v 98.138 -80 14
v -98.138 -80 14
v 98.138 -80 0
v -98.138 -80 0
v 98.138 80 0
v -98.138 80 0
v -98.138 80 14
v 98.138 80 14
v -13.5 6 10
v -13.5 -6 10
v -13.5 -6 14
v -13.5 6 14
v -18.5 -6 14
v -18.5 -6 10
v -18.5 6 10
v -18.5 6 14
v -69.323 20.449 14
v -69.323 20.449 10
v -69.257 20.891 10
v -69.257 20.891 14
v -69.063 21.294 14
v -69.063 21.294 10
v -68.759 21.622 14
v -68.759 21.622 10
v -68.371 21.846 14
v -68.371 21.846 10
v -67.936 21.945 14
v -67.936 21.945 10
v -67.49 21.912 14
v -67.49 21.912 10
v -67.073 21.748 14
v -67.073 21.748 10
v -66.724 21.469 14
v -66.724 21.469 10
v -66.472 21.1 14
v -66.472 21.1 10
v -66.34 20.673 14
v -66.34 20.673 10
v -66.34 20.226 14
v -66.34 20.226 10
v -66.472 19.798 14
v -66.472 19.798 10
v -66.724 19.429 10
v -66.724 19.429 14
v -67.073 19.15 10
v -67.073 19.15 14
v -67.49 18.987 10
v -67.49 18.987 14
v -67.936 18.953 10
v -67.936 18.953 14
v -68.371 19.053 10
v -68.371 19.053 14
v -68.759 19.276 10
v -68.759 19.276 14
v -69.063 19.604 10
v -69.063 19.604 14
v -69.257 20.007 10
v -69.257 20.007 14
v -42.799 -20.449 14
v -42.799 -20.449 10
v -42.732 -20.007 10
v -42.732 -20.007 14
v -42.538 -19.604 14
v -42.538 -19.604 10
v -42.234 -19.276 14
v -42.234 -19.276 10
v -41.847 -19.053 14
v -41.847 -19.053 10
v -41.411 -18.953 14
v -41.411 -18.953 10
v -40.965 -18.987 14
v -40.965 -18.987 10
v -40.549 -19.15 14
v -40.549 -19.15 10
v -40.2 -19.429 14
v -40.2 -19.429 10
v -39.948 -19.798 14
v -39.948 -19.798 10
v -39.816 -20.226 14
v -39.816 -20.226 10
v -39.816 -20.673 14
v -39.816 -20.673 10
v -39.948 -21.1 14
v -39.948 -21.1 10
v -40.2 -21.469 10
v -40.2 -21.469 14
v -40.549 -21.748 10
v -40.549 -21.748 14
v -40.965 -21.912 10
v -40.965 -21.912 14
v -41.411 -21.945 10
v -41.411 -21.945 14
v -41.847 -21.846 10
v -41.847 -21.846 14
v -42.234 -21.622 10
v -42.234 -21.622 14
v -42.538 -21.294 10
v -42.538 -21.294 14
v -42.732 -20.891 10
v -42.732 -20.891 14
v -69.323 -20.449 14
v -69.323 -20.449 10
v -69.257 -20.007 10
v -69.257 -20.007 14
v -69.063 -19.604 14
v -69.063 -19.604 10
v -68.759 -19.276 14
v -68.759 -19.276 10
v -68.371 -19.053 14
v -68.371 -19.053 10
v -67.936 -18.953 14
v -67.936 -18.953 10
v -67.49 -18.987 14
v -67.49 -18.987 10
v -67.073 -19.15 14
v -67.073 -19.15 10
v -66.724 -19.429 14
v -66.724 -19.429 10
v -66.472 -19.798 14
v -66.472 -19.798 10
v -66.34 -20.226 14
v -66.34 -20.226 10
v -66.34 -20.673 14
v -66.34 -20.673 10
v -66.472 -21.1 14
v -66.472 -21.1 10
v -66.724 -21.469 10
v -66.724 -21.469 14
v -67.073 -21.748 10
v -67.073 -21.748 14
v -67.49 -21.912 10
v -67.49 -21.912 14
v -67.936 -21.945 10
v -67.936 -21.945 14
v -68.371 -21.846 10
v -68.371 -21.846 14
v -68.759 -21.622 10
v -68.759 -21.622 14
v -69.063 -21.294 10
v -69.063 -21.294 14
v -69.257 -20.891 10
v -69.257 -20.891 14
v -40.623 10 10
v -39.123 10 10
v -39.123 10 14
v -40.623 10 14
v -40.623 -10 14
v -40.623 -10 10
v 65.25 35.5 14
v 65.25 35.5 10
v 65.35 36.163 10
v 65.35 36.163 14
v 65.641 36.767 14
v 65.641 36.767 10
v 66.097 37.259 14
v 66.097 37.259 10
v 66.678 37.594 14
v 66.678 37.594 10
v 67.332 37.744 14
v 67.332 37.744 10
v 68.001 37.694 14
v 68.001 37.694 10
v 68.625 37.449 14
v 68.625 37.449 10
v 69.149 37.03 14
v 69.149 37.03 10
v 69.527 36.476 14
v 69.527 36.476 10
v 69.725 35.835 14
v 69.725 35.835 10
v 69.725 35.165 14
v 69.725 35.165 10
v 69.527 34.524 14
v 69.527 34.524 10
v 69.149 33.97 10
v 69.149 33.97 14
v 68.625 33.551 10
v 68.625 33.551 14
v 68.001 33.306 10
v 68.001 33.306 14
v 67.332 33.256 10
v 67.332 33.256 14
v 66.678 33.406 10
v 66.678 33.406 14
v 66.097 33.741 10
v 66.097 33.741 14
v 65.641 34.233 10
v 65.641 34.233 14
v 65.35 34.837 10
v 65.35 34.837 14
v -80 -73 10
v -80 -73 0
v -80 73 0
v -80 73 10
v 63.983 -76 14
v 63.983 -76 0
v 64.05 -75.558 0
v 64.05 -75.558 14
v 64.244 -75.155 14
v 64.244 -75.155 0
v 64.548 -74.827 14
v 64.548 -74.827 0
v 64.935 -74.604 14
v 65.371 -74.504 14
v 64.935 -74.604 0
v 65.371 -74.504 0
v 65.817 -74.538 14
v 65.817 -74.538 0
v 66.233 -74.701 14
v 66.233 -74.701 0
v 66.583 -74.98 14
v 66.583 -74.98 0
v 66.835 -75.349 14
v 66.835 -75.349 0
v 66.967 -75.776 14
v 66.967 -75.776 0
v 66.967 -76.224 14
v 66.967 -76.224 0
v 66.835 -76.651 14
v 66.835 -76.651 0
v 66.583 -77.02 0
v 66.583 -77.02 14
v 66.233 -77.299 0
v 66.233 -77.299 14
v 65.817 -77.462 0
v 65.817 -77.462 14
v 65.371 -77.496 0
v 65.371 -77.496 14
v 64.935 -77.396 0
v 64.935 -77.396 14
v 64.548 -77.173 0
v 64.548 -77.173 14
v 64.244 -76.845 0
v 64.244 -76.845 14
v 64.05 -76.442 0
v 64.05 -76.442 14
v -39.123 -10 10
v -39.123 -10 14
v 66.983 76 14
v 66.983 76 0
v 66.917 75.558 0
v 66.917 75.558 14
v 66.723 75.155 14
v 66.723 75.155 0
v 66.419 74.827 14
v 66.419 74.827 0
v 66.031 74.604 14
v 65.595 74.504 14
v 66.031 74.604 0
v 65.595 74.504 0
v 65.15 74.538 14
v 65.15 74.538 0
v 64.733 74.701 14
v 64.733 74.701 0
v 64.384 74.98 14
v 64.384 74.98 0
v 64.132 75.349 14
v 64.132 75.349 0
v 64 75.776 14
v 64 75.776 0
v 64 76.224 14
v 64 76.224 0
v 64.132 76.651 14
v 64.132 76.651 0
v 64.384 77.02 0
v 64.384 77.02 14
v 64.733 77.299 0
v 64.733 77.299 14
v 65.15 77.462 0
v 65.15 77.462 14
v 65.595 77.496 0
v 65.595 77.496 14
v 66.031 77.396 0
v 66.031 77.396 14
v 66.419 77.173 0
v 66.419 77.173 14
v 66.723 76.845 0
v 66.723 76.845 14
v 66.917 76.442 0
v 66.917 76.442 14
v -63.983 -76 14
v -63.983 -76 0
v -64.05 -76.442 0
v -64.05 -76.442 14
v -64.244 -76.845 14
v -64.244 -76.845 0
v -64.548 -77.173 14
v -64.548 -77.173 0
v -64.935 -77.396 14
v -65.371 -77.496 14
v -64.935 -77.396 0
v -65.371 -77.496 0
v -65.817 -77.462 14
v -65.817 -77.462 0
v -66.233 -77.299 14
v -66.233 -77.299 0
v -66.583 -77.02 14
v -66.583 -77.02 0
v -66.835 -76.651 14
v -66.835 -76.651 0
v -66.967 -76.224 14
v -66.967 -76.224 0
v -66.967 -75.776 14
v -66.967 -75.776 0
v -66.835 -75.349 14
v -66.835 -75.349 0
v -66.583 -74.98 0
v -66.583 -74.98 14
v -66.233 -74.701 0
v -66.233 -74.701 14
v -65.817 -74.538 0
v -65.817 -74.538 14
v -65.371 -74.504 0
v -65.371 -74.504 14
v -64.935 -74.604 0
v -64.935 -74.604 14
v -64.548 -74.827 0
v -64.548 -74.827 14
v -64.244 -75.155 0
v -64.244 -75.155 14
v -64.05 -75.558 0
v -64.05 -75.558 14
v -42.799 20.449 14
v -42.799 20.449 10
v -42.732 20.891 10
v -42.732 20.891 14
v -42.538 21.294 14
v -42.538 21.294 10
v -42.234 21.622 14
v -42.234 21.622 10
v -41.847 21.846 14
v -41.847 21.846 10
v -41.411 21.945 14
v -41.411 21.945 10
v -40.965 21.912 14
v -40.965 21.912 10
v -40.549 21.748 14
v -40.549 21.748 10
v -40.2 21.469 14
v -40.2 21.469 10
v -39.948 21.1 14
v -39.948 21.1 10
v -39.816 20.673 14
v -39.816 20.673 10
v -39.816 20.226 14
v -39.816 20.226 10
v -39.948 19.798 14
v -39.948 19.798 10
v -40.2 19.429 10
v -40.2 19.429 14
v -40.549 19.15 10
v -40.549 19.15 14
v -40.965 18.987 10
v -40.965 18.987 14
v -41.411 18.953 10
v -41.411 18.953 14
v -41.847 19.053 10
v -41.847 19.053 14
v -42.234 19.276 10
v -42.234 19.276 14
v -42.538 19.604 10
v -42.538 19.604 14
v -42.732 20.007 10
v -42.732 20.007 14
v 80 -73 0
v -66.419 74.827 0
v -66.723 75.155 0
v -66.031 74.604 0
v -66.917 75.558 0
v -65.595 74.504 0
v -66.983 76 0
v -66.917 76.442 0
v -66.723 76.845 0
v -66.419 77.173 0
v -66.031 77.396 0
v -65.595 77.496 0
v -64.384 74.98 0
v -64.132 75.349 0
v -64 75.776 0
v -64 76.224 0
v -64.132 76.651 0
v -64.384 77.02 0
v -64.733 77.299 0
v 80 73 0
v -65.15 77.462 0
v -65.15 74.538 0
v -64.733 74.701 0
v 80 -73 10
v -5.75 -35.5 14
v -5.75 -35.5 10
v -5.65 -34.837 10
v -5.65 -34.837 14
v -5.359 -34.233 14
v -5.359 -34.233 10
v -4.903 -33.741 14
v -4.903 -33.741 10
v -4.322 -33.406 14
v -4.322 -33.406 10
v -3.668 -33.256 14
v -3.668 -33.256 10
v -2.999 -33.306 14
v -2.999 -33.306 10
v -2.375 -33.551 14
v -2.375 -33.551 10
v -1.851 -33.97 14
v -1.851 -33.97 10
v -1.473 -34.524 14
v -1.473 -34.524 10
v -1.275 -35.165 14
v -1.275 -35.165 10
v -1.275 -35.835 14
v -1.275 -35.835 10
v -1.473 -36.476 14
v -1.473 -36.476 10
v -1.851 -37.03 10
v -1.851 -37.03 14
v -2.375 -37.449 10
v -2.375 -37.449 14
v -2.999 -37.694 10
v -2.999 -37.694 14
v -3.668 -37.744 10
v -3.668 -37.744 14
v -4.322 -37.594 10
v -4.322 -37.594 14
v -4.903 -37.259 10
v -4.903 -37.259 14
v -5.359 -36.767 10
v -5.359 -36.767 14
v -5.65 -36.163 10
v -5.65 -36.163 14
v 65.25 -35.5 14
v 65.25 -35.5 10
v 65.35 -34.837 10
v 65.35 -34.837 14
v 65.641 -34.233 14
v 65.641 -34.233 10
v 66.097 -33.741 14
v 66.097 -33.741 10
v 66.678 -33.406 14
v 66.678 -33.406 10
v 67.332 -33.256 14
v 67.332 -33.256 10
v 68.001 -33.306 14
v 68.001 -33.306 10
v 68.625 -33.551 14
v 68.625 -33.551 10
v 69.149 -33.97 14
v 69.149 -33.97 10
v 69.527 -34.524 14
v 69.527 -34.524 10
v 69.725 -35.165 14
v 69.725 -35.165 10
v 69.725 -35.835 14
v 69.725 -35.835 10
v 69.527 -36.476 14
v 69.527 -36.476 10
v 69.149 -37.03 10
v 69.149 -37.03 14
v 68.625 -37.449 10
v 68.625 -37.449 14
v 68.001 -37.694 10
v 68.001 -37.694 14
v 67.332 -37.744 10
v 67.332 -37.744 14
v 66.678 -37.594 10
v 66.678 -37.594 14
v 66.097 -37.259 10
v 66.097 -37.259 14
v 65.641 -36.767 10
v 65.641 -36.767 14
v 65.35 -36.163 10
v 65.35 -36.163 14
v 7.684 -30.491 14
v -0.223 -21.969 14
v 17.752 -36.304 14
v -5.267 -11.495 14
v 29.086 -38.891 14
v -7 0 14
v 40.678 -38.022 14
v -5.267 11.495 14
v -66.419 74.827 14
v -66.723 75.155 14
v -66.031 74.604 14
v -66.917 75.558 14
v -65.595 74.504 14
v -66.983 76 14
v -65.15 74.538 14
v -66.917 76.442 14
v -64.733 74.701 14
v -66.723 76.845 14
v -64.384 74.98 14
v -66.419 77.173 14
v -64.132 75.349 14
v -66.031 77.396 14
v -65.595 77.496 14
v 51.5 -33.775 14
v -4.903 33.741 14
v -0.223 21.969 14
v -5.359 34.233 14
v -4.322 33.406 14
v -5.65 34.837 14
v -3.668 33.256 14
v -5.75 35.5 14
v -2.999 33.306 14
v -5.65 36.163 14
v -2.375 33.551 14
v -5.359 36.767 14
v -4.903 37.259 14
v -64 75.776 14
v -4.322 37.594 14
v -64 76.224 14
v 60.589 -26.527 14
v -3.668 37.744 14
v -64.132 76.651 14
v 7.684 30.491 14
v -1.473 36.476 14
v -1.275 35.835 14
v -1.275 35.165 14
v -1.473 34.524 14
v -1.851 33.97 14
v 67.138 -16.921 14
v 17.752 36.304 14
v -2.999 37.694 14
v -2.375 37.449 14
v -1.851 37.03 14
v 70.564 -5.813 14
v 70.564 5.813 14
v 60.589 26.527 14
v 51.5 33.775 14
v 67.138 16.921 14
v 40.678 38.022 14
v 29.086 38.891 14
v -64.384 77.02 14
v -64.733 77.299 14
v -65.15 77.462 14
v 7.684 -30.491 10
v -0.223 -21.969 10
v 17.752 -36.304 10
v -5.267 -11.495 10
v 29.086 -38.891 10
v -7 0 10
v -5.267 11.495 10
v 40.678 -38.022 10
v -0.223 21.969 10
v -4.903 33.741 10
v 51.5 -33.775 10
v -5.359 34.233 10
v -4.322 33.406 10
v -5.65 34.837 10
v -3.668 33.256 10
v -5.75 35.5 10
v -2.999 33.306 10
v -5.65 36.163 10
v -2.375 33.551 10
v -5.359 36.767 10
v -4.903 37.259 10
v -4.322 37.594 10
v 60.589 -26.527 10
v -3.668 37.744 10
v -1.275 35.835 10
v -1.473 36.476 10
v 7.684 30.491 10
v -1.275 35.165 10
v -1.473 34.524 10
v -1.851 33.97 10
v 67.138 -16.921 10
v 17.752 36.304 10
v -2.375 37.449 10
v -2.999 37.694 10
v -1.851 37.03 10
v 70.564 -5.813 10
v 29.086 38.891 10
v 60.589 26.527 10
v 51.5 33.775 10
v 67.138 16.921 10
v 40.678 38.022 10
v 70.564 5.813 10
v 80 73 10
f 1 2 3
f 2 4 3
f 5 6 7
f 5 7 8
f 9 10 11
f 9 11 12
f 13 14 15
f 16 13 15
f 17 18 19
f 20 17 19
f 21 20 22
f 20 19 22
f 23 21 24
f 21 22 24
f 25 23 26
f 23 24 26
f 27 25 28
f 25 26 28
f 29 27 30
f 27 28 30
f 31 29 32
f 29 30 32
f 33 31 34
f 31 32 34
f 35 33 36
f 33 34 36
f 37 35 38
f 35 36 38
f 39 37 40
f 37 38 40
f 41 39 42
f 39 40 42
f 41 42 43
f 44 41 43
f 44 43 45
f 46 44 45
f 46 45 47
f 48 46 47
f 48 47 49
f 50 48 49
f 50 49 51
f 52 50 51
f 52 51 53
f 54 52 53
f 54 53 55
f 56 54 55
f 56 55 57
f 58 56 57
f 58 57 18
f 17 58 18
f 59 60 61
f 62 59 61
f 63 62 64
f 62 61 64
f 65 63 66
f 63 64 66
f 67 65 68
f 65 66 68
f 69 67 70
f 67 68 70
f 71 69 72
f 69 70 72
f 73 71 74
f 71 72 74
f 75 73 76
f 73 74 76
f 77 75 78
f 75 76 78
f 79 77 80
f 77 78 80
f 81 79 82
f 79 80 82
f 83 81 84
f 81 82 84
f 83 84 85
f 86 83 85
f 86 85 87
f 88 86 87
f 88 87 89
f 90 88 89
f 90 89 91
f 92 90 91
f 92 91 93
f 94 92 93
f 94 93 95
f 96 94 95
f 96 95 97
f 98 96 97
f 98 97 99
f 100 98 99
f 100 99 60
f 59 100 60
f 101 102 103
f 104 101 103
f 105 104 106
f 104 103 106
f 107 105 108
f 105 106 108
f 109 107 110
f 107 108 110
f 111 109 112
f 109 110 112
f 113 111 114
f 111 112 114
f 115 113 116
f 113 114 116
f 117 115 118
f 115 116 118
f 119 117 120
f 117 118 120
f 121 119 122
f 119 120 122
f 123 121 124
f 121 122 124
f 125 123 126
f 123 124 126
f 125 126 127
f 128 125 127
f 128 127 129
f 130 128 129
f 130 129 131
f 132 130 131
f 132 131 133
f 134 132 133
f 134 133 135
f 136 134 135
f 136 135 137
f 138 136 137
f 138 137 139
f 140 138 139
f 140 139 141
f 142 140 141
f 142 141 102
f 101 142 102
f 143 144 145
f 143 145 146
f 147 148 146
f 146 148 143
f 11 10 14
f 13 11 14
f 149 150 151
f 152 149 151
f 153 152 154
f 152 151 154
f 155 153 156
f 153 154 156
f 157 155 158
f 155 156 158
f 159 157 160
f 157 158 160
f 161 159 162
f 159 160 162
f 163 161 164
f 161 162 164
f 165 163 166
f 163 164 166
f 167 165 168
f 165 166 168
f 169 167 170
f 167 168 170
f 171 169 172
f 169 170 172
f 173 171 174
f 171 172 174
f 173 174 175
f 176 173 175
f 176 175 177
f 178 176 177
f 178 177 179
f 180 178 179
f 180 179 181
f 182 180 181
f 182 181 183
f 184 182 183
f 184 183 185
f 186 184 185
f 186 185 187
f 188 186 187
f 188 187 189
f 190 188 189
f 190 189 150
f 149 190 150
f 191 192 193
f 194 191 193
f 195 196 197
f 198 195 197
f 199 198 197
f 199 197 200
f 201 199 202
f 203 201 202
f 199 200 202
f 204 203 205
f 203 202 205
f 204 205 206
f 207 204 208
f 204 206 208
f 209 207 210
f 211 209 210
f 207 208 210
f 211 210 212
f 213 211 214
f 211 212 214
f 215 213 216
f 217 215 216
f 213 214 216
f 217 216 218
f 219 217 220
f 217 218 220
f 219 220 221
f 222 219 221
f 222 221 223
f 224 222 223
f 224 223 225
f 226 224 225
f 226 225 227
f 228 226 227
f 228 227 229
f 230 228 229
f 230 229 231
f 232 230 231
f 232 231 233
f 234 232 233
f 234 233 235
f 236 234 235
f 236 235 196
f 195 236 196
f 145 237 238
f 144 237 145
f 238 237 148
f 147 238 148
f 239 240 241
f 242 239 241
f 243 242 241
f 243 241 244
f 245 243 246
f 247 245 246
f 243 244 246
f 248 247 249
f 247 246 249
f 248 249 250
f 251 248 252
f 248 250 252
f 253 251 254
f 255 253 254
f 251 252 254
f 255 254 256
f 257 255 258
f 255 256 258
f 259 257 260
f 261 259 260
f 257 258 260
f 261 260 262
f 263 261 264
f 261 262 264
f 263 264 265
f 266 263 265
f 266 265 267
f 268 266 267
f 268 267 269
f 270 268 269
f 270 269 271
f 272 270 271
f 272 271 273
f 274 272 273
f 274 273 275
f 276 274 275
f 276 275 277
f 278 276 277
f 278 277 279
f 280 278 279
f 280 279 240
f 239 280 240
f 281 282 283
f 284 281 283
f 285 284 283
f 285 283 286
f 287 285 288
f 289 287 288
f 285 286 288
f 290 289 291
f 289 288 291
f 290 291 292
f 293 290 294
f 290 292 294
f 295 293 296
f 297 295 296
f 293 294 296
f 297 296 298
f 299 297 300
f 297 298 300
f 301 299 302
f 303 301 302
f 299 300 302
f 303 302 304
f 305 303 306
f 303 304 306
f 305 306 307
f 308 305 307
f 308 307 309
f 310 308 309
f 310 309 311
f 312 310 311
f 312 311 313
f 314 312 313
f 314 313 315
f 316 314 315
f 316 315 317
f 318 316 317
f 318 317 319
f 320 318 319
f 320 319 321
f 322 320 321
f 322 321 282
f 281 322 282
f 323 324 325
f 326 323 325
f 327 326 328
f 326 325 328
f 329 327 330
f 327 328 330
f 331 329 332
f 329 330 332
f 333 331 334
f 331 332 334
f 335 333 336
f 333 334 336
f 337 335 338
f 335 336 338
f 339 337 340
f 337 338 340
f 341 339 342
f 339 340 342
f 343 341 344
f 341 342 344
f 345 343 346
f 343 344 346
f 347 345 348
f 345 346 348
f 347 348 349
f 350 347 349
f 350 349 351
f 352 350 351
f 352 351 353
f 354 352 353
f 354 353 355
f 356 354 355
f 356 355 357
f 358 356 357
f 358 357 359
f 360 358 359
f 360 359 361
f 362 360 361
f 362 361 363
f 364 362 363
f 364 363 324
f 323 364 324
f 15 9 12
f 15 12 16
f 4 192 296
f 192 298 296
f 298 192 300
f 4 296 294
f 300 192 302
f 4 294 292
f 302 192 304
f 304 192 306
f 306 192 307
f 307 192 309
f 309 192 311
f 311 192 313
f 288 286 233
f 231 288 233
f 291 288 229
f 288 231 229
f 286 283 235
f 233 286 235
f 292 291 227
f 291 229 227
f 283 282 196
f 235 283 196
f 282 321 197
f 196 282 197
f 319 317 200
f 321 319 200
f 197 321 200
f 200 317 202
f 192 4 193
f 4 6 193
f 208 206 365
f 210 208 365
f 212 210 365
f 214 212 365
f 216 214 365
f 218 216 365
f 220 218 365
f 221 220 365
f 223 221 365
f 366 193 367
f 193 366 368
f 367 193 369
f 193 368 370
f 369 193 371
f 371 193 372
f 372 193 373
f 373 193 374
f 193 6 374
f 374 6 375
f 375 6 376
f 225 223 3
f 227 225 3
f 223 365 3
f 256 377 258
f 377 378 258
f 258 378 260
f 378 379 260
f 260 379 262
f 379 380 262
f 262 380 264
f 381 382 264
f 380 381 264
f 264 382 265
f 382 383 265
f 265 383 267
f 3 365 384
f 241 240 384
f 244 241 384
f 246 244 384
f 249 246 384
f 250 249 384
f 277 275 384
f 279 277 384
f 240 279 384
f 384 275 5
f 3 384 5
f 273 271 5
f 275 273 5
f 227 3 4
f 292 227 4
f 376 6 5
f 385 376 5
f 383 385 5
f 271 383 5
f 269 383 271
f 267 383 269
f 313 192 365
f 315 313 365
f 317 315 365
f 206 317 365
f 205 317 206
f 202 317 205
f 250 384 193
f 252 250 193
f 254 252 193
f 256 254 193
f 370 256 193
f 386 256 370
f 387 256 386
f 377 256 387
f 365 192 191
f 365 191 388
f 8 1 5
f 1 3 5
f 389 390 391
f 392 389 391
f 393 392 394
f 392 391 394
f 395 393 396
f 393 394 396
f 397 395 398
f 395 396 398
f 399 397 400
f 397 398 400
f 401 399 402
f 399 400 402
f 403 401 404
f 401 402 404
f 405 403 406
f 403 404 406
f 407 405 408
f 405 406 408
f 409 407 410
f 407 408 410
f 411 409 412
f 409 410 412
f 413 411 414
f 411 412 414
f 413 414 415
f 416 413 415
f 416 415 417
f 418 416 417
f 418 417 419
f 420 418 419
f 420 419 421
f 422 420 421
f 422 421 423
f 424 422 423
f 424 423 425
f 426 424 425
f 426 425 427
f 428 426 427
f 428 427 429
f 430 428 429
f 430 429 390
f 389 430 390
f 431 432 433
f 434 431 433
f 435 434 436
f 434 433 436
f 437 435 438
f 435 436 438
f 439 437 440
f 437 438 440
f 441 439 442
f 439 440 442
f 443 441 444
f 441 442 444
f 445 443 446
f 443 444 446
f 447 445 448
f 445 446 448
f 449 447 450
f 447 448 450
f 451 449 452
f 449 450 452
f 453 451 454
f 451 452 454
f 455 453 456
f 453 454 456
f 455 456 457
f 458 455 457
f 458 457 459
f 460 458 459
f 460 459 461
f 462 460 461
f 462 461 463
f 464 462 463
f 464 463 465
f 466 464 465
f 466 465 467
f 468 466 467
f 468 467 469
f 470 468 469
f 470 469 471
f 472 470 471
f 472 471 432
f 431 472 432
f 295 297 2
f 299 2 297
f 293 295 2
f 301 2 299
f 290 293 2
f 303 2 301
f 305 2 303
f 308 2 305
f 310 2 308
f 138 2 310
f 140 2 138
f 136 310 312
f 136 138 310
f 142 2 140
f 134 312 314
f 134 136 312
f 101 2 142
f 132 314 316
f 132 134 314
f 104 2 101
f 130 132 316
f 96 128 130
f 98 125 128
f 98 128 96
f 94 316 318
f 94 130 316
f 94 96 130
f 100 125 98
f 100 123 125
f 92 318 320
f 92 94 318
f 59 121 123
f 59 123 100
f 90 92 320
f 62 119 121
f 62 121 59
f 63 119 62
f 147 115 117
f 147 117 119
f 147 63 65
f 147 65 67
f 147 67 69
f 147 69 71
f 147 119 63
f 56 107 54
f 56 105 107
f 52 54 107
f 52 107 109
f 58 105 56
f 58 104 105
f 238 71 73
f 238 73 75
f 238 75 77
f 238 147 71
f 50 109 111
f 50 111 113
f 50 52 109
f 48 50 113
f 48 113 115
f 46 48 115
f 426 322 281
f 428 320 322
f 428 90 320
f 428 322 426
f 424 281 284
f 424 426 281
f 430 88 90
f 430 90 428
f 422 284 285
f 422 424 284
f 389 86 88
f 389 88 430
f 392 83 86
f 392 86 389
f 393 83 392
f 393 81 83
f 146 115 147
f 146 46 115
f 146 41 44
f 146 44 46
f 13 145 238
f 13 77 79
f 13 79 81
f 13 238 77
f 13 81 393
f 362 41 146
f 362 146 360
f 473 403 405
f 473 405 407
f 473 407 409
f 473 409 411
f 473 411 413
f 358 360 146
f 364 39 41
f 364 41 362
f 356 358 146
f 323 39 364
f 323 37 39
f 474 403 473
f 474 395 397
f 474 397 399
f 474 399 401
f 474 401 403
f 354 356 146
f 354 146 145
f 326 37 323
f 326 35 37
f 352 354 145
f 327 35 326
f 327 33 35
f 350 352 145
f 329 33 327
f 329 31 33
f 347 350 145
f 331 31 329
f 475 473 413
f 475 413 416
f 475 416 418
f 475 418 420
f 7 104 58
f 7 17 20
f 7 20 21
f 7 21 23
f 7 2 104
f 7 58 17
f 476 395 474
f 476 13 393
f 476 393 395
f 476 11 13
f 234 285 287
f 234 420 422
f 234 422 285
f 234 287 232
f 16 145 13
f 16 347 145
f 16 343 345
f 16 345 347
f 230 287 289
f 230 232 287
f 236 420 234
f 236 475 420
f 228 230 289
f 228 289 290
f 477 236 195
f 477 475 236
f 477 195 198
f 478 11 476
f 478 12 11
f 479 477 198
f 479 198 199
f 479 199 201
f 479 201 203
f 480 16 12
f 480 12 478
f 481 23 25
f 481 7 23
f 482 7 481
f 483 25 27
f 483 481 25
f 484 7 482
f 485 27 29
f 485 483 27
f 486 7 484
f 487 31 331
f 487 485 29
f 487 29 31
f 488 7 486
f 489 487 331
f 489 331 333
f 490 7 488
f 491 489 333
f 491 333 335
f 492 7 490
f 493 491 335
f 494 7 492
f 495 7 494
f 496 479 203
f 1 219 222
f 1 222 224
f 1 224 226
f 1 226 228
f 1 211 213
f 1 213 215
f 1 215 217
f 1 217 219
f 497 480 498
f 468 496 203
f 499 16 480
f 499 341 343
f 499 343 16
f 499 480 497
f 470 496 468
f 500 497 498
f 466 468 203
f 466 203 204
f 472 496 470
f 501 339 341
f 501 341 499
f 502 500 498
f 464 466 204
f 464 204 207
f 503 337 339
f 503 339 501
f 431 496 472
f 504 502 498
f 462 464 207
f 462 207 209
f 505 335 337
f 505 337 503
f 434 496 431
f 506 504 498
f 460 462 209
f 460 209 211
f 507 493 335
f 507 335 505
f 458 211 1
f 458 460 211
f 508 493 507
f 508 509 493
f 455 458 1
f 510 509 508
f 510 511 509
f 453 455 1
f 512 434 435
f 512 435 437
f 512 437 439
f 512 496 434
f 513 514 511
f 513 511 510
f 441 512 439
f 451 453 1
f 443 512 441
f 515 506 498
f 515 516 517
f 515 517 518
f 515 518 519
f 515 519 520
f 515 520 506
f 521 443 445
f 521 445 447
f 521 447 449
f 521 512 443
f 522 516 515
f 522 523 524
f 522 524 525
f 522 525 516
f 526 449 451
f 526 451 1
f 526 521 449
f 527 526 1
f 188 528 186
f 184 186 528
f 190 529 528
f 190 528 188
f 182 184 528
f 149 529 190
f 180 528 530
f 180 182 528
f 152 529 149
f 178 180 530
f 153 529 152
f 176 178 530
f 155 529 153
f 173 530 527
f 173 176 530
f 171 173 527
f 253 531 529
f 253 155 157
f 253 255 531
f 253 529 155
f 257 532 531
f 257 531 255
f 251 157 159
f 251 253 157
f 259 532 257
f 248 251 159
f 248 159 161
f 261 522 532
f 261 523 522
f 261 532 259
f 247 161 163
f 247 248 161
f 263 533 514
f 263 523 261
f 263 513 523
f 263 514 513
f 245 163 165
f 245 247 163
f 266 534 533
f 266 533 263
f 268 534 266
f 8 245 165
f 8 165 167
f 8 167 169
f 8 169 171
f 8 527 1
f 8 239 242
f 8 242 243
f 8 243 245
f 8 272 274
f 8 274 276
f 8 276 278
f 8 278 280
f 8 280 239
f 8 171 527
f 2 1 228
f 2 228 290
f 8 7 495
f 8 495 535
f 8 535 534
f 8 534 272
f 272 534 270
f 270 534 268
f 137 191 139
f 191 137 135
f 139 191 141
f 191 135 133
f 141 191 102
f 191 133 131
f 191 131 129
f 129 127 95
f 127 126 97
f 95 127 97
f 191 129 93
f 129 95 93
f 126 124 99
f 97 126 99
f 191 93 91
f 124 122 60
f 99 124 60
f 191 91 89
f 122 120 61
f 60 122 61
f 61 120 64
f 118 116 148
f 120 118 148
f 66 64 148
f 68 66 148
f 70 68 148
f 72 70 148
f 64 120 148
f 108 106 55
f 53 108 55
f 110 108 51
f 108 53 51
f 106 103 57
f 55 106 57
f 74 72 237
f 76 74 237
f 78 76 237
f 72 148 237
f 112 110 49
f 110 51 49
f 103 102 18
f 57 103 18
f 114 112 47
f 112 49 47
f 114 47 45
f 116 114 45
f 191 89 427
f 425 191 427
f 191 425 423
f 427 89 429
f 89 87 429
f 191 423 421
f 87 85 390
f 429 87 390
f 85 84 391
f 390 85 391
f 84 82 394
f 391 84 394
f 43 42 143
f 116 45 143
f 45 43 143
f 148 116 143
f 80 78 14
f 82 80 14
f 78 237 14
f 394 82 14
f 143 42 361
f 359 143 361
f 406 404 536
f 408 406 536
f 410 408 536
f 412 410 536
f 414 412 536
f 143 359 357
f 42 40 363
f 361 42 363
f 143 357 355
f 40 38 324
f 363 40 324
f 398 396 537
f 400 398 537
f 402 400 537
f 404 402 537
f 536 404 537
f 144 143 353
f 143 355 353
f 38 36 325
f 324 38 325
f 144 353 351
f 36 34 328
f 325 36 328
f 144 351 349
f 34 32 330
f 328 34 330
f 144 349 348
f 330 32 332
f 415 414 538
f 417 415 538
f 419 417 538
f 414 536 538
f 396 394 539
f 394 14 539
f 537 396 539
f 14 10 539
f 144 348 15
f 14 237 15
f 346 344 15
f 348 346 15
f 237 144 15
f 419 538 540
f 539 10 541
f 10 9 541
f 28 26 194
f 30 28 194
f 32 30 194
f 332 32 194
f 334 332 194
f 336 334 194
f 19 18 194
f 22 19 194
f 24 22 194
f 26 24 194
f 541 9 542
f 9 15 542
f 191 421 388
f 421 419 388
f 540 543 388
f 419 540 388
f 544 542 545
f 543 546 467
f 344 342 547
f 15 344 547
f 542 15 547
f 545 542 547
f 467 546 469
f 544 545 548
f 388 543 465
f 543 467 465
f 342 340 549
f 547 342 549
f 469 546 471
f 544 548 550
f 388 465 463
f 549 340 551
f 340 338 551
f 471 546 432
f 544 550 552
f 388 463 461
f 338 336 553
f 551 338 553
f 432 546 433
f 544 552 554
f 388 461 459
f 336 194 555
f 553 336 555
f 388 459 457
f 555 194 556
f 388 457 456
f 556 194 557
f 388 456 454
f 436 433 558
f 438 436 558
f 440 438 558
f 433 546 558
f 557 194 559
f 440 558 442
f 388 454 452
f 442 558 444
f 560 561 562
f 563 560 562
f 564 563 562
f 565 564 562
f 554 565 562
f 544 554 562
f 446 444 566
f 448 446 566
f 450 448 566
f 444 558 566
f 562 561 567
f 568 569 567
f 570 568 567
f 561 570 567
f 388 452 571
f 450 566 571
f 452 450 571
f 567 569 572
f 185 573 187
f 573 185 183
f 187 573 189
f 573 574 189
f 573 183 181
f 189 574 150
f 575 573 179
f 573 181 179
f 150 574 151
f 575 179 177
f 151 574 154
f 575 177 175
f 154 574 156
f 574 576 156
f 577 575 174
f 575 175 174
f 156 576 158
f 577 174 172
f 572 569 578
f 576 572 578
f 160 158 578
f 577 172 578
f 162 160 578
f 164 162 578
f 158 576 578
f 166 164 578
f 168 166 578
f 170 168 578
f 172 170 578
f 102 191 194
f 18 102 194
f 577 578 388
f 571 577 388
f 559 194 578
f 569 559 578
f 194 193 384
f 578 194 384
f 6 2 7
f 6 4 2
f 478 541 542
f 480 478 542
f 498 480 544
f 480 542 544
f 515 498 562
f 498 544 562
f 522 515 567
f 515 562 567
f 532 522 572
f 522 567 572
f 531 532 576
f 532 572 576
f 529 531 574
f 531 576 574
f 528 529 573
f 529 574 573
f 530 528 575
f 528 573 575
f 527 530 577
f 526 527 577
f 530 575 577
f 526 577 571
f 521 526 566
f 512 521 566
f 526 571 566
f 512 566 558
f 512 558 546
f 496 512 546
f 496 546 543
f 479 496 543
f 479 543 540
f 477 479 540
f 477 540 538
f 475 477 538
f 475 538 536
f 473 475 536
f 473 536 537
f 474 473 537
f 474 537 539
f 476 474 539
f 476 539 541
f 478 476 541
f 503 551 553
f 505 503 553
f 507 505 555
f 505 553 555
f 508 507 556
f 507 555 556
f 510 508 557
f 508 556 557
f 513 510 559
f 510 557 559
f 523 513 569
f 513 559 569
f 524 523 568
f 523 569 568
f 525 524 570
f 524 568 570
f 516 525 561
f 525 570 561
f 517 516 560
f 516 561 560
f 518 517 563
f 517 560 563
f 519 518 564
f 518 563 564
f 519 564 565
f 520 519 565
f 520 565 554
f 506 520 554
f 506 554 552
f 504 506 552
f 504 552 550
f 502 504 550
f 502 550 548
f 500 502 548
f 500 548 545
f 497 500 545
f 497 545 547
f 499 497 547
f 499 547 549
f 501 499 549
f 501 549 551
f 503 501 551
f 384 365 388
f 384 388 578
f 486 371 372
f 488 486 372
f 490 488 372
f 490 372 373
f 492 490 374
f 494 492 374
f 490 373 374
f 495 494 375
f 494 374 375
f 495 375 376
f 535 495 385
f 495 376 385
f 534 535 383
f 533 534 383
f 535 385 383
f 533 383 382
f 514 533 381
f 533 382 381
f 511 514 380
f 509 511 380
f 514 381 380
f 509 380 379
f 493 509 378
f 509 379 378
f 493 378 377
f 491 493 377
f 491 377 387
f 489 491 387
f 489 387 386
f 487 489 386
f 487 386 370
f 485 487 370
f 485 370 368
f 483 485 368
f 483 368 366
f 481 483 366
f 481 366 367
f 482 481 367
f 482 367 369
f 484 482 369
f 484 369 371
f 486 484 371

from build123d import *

# Parameters (mm, degrees)
SCHIZZO1_W                   = 196.27671429
SCHIZZO1_H                   = 160
SCHIZZO1_W_2                 = 160
SCHIZZO1_H_2                 = 146
ESTRUSIONE_ESTRUSIONE1_DEPTH = 10
SCHIZZO2_W                   = 196.27671429
SCHIZZO2_H                   = 160
ESTRUSIONE_ESTRUSIONE2_DEPTH = 4
SCHIZZO3_R                   = 1.5
TAGLIO_ESTRUSIONE1_DEPTH     = 93
SCHIZZO4_R                   = 39
SCHIZZO4_R_2                 = 2.25
SCHIZZO4_R_3                 = 1.5
SCHIZZO4_W                   = 5
SCHIZZO4_H                   = 12
SCHIZZO4_W_2                 = 1.5
SCHIZZO4_H_2                 = 20
TAGLIO_ESTRUSIONE2_DEPTH     = 90


with BuildPart() as part:
    # Schizzo1 → Estrusione-Estrusione1 (new body)
    with BuildSketch(Plane.XY):
        Rectangle(SCHIZZO1_W, SCHIZZO1_H)
        Rectangle(SCHIZZO1_W_2, SCHIZZO1_H_2, mode=Mode.SUBTRACT)
    extrude(amount=ESTRUSIONE_ESTRUSIONE1_DEPTH)

    # Schizzo2 → Estrusione-Estrusione2 (add)
    with BuildSketch(Plane.XY.offset(10)):
        Rectangle(SCHIZZO2_W, SCHIZZO2_H)
    extrude(amount=ESTRUSIONE_ESTRUSIONE2_DEPTH)

    # Schizzo3 → Taglio-Estrusione1 (cut)
    with BuildSketch(Plane(origin=(0, 0, 0), x_dir=(-1, 0, 0), z_dir=(0, 0, -1))):
        with Locations((65.48331215, 76)):
            Circle(SCHIZZO3_R)
        with Locations(Location((-65.48331215, 76, 0), (0, 0, 180))):
            Circle(SCHIZZO3_R)
        with Locations((-65.48331215, -76)):
            Circle(SCHIZZO3_R)
        with Locations(Location((65.48331215, -76, 0), (0, 0, 180))):
            Circle(SCHIZZO3_R)
    extrude(amount=-TAGLIO_ESTRUSIONE1_DEPTH, mode=Mode.SUBTRACT)

    # Schizzo4 → Taglio-Estrusione2 (cut)
    with BuildSketch(Plane(origin=(0, 0, 10), x_dir=(-1, 0, 0), z_dir=(0, 0, -1))):
        with Locations((-32, 0)):
            Circle(SCHIZZO4_R)
        with Locations((3.499999997, 35.499999997)):
            Circle(SCHIZZO4_R_2)
        with Locations((3.499999997, -35.499999997)):
            Circle(SCHIZZO4_R_2)
        with Locations((-67.499999997, 35.499999997)):
            Circle(SCHIZZO4_R_2)
        with Locations((-67.499999997, -35.499999997)):
            Circle(SCHIZZO4_R_2)
        with Locations((41.299094201, 20.449190864)):
            Circle(SCHIZZO4_R_3)
        with Locations((41.299094201, -20.449190864)):
            Circle(SCHIZZO4_R_3)
        with Locations((67.823483409, -20.449190864)):
            Circle(SCHIZZO4_R_3)
        with Locations((67.823483409, 20.449190864)):
            Circle(SCHIZZO4_R_3)
        with Locations((16, 0)):
            Rectangle(SCHIZZO4_W, SCHIZZO4_H)
        with Locations((39.87257761, 0)):
            Rectangle(SCHIZZO4_W_2, SCHIZZO4_H_2)
    extrude(amount=-TAGLIO_ESTRUSIONE2_DEPTH, mode=Mode.SUBTRACT)


solid = part.part
